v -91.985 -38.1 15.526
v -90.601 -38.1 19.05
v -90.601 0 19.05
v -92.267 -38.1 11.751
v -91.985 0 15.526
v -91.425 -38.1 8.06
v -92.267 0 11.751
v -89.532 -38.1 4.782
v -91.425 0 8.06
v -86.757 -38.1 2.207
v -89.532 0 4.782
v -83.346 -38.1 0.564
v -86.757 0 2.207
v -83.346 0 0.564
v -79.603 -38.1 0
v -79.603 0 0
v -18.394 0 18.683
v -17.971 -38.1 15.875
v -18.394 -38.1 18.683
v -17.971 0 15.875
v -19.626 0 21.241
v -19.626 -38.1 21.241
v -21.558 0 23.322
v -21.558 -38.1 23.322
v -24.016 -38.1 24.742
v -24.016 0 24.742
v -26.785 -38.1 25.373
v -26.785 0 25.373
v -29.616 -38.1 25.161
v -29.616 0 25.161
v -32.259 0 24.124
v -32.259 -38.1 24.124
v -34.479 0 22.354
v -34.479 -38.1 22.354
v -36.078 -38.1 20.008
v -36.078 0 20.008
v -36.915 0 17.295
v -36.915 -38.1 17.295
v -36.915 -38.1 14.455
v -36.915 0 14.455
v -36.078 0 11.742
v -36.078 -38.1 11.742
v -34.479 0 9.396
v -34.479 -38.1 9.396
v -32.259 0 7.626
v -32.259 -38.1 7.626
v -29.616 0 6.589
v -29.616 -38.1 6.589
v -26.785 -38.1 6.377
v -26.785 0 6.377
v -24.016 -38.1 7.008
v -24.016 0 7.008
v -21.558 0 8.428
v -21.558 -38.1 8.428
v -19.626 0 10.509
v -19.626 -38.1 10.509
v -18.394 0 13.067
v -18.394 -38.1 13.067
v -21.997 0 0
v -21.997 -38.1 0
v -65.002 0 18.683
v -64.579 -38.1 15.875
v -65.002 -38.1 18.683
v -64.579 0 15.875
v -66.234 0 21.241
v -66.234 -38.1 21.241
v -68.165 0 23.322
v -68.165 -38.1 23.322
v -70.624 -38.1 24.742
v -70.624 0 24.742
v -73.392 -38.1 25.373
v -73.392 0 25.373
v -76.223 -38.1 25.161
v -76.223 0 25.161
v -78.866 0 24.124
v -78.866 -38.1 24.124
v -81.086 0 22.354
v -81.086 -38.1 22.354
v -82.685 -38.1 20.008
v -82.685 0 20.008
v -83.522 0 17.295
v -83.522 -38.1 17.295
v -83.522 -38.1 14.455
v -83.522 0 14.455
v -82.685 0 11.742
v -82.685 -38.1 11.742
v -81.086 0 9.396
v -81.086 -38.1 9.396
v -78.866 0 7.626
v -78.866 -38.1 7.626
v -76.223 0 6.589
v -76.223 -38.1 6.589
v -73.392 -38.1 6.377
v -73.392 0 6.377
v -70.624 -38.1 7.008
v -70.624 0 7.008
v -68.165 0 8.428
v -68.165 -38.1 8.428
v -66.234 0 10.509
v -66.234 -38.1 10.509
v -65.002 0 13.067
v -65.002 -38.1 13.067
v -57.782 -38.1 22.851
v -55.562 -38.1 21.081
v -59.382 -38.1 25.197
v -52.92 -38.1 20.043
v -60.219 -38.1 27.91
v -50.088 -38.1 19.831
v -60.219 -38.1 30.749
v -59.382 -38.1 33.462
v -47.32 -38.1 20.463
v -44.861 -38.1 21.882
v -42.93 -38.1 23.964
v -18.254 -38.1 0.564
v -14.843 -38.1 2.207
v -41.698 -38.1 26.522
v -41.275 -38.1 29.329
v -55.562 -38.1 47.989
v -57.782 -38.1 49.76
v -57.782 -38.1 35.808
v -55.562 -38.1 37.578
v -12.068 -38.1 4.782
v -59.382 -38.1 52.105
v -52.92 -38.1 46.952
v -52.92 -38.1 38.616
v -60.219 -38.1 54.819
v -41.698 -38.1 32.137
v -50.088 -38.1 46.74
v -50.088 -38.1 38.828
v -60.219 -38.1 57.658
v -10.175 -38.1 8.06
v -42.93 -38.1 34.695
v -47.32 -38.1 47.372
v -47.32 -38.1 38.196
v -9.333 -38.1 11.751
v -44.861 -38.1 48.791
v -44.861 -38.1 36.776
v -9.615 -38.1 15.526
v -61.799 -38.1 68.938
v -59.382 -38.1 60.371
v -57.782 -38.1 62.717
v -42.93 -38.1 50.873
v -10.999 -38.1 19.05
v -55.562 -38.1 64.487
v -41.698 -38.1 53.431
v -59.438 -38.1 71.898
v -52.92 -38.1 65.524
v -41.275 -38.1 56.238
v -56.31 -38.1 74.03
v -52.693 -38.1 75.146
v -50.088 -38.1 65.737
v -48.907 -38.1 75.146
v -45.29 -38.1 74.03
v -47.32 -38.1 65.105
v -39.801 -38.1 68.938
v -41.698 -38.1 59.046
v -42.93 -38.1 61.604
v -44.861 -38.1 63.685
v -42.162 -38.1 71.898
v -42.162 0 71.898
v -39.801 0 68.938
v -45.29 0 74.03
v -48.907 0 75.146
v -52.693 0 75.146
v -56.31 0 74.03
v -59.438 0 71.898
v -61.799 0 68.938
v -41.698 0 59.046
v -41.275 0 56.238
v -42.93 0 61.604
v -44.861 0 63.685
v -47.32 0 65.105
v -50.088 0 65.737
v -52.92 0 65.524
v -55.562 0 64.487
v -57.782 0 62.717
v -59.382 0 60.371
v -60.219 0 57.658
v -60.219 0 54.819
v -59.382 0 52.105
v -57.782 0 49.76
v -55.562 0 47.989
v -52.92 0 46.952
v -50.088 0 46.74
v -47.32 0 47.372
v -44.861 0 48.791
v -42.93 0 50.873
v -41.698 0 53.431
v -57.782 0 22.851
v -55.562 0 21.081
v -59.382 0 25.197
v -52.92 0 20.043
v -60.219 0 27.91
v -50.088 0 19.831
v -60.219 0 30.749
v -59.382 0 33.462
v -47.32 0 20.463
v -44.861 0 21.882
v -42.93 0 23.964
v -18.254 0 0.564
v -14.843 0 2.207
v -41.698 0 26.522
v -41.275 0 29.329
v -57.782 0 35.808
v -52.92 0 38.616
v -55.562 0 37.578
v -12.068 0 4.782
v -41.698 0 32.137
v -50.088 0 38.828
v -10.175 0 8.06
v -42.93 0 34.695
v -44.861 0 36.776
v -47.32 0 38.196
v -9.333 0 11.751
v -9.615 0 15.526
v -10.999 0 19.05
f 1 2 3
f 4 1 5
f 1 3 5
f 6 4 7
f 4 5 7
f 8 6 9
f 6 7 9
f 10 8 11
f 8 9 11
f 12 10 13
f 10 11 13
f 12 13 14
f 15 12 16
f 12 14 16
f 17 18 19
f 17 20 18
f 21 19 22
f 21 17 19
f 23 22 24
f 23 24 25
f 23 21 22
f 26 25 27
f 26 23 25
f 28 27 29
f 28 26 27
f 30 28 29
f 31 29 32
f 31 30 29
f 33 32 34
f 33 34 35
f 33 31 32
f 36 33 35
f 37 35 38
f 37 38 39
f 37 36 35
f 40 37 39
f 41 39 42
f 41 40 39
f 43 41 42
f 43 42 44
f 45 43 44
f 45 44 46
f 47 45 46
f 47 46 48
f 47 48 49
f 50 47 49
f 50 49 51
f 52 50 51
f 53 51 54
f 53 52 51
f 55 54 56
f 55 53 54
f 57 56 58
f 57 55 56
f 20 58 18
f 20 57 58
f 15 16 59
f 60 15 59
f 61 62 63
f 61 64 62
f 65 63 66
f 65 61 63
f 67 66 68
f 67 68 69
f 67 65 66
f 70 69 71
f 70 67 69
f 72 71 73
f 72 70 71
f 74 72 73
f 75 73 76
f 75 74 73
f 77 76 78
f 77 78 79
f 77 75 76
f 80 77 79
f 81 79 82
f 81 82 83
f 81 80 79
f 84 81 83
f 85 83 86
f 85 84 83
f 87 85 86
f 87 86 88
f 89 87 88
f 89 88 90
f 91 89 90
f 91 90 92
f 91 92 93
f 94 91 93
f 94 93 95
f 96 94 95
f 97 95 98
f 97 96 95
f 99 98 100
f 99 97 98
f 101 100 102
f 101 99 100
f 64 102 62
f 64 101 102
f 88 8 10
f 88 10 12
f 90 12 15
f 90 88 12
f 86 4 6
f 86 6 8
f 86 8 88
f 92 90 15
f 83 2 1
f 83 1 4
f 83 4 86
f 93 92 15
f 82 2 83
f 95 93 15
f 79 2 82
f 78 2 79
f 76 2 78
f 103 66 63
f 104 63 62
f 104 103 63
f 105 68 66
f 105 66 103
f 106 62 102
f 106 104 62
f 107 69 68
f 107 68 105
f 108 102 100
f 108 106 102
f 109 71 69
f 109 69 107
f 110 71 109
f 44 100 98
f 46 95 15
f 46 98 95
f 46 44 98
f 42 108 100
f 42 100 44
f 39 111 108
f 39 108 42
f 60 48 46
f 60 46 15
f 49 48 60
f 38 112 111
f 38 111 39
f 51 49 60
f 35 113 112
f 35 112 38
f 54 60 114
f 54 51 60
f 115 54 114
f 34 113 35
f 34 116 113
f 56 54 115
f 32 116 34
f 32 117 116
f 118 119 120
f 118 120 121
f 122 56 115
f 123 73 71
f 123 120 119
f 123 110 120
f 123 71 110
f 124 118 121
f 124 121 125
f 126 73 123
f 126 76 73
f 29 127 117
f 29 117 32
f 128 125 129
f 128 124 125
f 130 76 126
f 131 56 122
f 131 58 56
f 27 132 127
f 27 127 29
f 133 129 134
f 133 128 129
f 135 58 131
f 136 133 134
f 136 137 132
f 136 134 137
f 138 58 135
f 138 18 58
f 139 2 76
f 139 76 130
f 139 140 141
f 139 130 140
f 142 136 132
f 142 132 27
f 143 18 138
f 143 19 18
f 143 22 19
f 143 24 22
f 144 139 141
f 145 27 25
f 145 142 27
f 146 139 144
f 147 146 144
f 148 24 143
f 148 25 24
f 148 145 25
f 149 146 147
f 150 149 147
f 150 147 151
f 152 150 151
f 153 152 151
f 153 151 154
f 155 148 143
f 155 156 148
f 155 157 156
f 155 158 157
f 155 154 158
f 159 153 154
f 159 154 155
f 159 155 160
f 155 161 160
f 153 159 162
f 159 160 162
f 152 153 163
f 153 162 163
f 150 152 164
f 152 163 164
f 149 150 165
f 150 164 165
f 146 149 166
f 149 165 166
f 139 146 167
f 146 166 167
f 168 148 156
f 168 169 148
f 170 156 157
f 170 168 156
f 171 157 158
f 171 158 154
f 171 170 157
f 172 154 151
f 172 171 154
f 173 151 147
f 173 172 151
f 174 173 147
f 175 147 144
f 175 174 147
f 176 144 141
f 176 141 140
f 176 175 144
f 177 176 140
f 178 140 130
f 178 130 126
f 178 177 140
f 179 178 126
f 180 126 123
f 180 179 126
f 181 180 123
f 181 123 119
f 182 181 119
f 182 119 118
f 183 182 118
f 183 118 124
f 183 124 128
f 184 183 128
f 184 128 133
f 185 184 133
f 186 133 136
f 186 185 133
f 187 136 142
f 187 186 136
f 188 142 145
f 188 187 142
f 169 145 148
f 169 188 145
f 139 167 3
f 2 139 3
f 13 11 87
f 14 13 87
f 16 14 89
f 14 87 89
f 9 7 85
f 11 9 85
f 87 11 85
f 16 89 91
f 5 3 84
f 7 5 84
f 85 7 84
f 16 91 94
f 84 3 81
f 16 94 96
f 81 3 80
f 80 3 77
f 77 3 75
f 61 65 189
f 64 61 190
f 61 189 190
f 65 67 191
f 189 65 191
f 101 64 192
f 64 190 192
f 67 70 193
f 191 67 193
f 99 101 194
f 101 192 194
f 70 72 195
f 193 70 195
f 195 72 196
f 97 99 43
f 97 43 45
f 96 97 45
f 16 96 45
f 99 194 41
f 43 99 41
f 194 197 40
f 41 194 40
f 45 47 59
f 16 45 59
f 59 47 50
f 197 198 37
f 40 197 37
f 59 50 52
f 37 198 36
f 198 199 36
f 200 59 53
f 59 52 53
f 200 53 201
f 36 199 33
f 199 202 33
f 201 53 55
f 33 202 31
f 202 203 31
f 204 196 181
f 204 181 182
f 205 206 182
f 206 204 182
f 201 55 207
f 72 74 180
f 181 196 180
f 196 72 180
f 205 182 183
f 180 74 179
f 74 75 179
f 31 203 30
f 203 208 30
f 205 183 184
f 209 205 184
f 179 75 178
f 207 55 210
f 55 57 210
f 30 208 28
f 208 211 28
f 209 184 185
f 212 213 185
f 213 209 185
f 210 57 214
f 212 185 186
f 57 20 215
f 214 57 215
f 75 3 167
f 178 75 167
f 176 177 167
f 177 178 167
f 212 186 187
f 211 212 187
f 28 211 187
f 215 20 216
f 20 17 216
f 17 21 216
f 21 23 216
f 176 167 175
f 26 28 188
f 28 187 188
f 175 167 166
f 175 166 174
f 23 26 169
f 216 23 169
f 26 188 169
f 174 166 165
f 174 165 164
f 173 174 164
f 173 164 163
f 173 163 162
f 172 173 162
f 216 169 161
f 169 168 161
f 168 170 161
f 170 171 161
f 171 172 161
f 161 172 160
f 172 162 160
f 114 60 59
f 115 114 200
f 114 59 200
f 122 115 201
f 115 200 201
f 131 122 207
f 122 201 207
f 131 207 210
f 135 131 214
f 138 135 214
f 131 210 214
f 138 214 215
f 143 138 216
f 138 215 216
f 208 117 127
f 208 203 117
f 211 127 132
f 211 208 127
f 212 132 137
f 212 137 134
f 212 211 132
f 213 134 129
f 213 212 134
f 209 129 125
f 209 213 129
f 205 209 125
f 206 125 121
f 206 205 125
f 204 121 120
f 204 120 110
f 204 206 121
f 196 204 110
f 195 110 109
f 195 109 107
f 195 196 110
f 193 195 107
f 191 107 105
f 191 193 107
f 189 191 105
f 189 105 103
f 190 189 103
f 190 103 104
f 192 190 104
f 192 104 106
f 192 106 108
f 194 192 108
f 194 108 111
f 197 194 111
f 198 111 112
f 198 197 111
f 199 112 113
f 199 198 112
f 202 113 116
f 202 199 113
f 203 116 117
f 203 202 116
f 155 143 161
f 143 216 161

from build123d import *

# Parameters (mm, degrees)
F0_R      = 9.525
F1_DEPTH  = 12.7
F1_FACE_R = 9.525
F2_DEPTH  = 25.4


with BuildPart() as f1:
    # F0 (on Front) → F1 (new body)
    with BuildSketch(Plane.XZ):
        with BuildLine():
            Line((-79.602955, 0), (-21.997045, 0))
            ThreePointArc((-21.997045, 0), (-10.998523, 6.35), (-10.998523, 19.05))
            Line((-10.998523, 19.05), (-39.801477, 68.938181))
            ThreePointArc((-39.801477, 68.938181), (-50.8, 75.288181), (-61.798523, 68.938181))
            Line((-61.798523, 68.938181), (-90.601477, 19.05))
            ThreePointArc((-90.601477, 19.05), (-90.601477, 6.35), (-79.602955, 0))
        make_face()
        with Locations((-74.103693, 15.875)):
            Circle(F0_R, mode=Mode.SUBTRACT)
        with Locations((-27.496307, 15.875)):
            Circle(F0_R, mode=Mode.SUBTRACT)
        with Locations((-50.8, 29.329394)):
            Circle(F0_R, mode=Mode.SUBTRACT)
        with Locations((-50.8, 56.238181)):
            Circle(F0_R, mode=Mode.SUBTRACT)
    extrude(amount=F1_DEPTH)

    # F1_face (on face) → F2 (join)
    with BuildSketch(Plane(origin=(-50.8, -12.7, 29.329394), x_dir=(1, 0, 0), z_dir=(0, -1, 0))):
        with BuildLine():
            Line((-28.802955, -29.329394), (28.802955, -29.329394))
            ThreePointArc((28.802955, -29.329394), (39.801477, -22.979394), (39.801477, -10.279394))
            Line((39.801477, -10.279394), (10.998523, 39.608787))
            ThreePointArc((10.998523, 39.608787), (0, 45.958787), (-10.998523, 39.608787))
            Line((-10.998523, 39.608787), (-39.801477, -10.279394))
            ThreePointArc((-39.801477, -10.279394), (-39.801477, -22.979394), (-28.802955, -29.329394))
        make_face()
        with Locations((-23.303693, -13.454394)):
            Circle(F1_FACE_R, mode=Mode.SUBTRACT)
        with Locations((23.303693, -13.454394)):
            Circle(F1_FACE_R, mode=Mode.SUBTRACT)
        Circle(F1_FACE_R, mode=Mode.SUBTRACT)
        with Locations((0, 26.908787)):
            Circle(F1_FACE_R, mode=Mode.SUBTRACT)
    extrude(amount=F2_DEPTH)


solid = f1.part
